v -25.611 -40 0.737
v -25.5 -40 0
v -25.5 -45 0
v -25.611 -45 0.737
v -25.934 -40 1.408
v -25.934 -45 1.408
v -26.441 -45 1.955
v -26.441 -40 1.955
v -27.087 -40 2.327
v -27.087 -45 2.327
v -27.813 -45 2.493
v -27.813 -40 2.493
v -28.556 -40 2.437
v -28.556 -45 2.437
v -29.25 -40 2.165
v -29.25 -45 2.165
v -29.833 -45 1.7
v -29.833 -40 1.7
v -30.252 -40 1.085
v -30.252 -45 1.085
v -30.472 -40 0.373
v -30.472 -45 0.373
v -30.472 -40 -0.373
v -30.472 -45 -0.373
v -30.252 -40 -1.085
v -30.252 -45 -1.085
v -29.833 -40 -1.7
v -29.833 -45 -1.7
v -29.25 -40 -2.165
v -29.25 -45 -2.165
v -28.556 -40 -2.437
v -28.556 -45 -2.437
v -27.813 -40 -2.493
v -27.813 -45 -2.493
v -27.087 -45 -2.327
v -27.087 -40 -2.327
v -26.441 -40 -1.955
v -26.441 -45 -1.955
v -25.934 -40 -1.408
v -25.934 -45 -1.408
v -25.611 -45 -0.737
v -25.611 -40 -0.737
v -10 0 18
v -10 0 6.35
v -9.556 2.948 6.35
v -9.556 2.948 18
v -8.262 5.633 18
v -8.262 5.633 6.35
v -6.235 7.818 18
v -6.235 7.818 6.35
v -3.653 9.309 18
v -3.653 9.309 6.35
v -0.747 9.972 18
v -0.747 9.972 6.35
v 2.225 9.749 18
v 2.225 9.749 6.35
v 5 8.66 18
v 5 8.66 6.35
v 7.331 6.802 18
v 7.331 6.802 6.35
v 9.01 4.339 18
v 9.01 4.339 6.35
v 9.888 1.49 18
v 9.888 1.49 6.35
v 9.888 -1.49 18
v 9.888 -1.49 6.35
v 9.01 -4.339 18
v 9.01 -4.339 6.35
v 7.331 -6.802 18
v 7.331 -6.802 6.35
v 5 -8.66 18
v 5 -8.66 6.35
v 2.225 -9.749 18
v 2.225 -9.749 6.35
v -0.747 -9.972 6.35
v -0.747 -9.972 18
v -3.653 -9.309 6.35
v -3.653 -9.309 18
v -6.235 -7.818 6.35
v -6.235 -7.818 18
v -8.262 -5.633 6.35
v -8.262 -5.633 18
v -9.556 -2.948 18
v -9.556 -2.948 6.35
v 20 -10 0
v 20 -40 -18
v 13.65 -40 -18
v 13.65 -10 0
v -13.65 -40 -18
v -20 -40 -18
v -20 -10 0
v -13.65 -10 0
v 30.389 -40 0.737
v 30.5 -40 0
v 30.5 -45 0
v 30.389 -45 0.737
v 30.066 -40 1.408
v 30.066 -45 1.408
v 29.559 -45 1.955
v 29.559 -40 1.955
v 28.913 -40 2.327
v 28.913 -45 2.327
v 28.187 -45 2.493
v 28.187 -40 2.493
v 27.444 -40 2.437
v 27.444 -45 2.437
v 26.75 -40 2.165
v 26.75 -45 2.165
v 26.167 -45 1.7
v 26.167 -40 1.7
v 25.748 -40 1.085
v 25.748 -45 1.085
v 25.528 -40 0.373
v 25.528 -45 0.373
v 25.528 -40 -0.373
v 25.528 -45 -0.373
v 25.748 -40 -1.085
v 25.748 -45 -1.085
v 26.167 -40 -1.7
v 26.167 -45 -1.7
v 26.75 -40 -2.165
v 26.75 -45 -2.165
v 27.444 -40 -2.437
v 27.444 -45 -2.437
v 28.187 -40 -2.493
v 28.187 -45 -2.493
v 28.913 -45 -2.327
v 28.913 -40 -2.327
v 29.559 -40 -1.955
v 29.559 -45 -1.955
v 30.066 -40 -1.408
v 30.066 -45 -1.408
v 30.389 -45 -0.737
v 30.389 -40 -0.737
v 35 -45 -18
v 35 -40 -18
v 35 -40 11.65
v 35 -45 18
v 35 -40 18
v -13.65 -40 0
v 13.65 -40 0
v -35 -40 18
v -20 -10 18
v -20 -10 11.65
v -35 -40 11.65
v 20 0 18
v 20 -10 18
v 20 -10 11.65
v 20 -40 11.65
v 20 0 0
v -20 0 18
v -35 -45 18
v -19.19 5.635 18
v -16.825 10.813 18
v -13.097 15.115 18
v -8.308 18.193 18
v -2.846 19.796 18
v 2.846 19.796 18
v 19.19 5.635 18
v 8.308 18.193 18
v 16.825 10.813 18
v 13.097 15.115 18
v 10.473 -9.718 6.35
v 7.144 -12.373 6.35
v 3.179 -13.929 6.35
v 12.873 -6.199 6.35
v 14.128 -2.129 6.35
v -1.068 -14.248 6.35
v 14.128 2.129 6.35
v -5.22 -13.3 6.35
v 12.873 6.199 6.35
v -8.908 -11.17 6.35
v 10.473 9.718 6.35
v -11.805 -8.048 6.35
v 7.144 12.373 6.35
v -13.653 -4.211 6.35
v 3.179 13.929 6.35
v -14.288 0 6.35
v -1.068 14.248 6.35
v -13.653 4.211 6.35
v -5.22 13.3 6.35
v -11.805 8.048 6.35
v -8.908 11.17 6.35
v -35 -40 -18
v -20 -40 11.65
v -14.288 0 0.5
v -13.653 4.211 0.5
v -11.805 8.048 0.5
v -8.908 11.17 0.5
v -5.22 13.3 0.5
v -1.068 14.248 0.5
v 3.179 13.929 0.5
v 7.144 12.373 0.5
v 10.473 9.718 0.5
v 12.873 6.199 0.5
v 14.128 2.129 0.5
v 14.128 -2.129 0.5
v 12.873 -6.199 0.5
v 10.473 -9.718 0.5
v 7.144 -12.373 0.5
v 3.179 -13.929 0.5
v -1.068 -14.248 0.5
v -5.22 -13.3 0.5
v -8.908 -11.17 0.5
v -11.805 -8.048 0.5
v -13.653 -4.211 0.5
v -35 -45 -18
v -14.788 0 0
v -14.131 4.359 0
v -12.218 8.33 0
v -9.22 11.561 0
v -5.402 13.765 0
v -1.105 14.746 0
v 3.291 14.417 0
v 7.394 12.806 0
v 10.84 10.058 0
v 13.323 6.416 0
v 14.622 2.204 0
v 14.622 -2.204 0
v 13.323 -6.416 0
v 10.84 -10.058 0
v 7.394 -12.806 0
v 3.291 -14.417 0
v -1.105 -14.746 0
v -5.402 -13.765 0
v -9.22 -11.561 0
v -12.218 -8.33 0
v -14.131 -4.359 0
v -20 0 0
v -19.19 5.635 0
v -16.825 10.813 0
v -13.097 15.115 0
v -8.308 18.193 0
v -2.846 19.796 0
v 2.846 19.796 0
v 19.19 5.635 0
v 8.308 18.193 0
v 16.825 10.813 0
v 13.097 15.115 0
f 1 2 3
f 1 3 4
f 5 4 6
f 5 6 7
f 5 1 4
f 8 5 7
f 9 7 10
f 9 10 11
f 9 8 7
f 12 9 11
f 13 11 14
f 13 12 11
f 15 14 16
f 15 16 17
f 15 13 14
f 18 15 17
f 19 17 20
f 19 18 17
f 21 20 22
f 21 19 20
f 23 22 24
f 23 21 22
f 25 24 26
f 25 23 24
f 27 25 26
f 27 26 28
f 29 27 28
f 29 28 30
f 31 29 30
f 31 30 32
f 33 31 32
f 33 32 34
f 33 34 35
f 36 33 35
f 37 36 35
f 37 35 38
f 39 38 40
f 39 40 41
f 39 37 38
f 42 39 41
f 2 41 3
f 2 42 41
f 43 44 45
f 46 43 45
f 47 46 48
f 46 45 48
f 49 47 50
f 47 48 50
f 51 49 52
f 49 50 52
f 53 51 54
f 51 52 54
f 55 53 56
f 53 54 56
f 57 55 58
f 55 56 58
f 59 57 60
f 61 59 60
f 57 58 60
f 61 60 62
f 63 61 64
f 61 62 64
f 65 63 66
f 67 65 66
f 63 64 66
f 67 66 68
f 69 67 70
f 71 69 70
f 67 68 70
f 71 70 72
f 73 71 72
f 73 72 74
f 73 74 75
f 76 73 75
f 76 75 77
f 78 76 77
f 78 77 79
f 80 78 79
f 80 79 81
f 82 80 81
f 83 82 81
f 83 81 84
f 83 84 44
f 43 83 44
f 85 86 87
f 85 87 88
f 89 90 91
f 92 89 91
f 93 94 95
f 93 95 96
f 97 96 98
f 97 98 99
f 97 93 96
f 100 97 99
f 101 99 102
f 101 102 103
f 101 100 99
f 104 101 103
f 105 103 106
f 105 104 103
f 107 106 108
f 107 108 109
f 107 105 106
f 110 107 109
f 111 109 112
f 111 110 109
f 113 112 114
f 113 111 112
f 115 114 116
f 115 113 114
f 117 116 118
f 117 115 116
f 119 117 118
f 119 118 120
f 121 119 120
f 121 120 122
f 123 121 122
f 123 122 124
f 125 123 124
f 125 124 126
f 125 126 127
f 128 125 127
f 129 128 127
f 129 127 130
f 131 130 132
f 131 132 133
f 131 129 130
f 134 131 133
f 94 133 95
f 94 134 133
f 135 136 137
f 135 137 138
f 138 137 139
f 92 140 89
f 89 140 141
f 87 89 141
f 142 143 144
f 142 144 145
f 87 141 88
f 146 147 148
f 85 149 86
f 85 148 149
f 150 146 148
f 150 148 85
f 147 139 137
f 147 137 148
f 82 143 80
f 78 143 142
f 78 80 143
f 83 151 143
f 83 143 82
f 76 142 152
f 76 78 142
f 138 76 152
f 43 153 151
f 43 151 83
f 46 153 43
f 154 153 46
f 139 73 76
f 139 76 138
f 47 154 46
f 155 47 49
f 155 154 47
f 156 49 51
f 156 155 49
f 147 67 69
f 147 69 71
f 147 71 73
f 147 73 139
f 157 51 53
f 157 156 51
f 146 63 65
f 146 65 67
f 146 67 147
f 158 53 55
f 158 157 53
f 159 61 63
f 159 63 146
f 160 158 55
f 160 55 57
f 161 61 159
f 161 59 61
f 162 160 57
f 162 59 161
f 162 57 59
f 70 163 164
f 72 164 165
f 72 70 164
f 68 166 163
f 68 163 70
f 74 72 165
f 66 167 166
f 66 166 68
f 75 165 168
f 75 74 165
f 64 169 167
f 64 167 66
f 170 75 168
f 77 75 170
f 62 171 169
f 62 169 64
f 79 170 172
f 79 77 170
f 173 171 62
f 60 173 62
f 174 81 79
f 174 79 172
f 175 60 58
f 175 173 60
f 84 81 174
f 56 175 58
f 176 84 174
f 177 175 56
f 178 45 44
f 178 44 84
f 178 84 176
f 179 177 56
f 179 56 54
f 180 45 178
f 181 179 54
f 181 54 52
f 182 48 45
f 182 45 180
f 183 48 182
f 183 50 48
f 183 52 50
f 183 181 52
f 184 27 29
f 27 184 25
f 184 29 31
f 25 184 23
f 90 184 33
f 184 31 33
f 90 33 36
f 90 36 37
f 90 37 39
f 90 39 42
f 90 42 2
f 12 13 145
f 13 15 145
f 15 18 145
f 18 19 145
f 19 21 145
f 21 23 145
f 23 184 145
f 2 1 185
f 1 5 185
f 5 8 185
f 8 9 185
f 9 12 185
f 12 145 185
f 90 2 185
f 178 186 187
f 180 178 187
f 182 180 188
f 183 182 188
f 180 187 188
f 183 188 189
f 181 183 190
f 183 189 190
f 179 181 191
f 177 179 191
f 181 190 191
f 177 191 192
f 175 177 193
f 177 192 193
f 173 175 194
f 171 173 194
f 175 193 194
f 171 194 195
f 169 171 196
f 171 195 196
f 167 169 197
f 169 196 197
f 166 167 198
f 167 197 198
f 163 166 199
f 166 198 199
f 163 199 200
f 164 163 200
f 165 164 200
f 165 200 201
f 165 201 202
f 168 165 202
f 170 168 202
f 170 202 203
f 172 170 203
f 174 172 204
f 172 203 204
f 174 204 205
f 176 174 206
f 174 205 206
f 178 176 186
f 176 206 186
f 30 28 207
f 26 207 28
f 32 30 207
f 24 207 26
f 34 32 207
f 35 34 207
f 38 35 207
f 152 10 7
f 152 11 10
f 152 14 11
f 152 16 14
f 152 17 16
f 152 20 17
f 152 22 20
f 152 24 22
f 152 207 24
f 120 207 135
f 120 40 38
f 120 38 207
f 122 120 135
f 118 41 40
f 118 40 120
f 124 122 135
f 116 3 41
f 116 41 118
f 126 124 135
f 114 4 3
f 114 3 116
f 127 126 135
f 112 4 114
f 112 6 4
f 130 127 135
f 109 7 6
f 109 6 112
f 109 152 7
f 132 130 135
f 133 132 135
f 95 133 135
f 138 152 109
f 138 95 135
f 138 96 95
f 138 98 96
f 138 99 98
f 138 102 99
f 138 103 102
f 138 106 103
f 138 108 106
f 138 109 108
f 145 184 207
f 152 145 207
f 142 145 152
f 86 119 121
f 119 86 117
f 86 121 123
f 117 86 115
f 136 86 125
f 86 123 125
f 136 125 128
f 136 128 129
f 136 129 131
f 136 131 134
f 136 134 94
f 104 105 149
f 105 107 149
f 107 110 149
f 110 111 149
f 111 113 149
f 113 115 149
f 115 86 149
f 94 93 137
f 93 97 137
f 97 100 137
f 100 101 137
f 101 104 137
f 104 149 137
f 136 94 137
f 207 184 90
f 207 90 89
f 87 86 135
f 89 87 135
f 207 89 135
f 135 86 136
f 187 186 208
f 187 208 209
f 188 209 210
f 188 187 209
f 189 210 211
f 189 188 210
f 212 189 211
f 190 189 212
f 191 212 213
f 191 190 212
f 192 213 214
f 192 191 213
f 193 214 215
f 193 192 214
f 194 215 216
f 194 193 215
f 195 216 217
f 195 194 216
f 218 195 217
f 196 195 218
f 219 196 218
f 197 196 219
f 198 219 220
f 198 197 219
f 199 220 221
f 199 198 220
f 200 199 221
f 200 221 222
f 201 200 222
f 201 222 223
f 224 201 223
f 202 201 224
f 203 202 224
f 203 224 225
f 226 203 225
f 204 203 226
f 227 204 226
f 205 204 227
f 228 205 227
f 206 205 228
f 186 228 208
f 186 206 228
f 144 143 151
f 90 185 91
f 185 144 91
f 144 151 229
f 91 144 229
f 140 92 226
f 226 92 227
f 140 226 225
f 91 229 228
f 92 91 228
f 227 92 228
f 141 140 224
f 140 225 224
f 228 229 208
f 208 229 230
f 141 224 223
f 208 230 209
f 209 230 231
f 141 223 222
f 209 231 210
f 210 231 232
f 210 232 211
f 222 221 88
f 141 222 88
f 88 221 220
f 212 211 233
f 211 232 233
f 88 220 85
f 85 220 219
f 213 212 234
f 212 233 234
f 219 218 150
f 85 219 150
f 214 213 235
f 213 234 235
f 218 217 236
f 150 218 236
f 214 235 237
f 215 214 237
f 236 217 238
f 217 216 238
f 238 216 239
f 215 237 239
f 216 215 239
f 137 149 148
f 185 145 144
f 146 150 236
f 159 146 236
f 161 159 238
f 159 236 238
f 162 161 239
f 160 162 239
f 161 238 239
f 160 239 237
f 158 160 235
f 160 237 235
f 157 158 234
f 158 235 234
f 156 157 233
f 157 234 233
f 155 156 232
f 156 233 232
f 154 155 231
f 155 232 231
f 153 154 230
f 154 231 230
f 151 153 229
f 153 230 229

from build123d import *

# Parameters (mm, degrees)
BOSS_EXTRUDE1_DEPTH = 18
SKETCH6_W           = 70
SKETCH6_H           = 36
SKETCH6_R           = 2.5
BOSS_EXTRUDE2_DEPTH = 5
SKETCH7_R           = 10
CUT_EXTRUDE1_DEPTH  = 19
SKETCH8_R           = 14.2875
CUT_EXTRUDE2_DEPTH  = 6.35
CHAMFER1_SIZE       = 0.5
BOSS_EXTRUDE3_DEPTH = 6.35
BOSS_EXTRUDE4_DEPTH = 6.35


with BuildPart() as part:
    # Sketch3 → Boss-Extrude1 (new body)
    with BuildSketch(Plane.XY):
        with BuildLine():
            Line((-20, 0), (-20, -40))
            Line((-20, -40), (20, -40))
            Line((20, -40), (20, 0))
            ThreePointArc((20, 0), (0, 20), (-20, 0))
        make_face()
    extrude(amount=BOSS_EXTRUDE1_DEPTH)

    # Sketch6 → Boss-Extrude2 (add)
    with BuildSketch(Plane.XZ.offset(40)):
        Rectangle(SKETCH6_W, SKETCH6_H)
        with Locations((28, 0)):
            Circle(SKETCH6_R, mode=Mode.SUBTRACT)
        with Locations((-28, 0)):
            Circle(SKETCH6_R, mode=Mode.SUBTRACT)
    extrude(amount=BOSS_EXTRUDE2_DEPTH)

    # Sketch7 → Cut-Extrude1 (cut, through all)
    with BuildSketch(Plane(origin=(0, 0, 0), x_dir=(-1, 0, 0), z_dir=(0, 0, -1))):
        Circle(SKETCH7_R)
    extrude(amount=-CUT_EXTRUDE1_DEPTH, mode=Mode.SUBTRACT)

    # Sketch8 → Cut-Extrude2 (cut)
    with BuildSketch(Plane(origin=(0, 0, 0), x_dir=(-1, 0, 0), z_dir=(0, 0, -1))):
        Circle(SKETCH8_R)
    extrude(amount=-CUT_EXTRUDE2_DEPTH, mode=Mode.SUBTRACT)

    # Chamfer1
    chamfer1_edges = [part.edges().sort_by_distance(p)[0] for p in [
        (14.2875, 0, 0),
    ]]
    chamfer(chamfer1_edges, length=CHAMFER1_SIZE)

    # Sketch9 → Boss-Extrude3 (add)
    with BuildSketch(Plane(origin=(20, 0, 0), x_dir=(0, 0, -1), z_dir=(1, 0, 0))):
        Polygon((18, -40), (0, -10), (0, -40), align=None)
    boss_extrude3 = extrude(amount=-BOSS_EXTRUDE3_DEPTH)

    # Mirror1: Boss-Extrude3 across plane
    add(boss_extrude3.mirror(Plane(origin=(0, 0, 0), x_dir=(0, 0, 1), z_dir=(1, 0, 0))))

    # Sketch10 → Boss-Extrude4 (add)
    with BuildSketch(Plane.XY.offset(18)):
        Polygon((-20, -10), (-35, -40), (-20, -40), align=None)
        Polygon((20, -10), (20, -40), (35, -40), align=None)
    extrude(amount=-BOSS_EXTRUDE4_DEPTH)


solid = part.part
